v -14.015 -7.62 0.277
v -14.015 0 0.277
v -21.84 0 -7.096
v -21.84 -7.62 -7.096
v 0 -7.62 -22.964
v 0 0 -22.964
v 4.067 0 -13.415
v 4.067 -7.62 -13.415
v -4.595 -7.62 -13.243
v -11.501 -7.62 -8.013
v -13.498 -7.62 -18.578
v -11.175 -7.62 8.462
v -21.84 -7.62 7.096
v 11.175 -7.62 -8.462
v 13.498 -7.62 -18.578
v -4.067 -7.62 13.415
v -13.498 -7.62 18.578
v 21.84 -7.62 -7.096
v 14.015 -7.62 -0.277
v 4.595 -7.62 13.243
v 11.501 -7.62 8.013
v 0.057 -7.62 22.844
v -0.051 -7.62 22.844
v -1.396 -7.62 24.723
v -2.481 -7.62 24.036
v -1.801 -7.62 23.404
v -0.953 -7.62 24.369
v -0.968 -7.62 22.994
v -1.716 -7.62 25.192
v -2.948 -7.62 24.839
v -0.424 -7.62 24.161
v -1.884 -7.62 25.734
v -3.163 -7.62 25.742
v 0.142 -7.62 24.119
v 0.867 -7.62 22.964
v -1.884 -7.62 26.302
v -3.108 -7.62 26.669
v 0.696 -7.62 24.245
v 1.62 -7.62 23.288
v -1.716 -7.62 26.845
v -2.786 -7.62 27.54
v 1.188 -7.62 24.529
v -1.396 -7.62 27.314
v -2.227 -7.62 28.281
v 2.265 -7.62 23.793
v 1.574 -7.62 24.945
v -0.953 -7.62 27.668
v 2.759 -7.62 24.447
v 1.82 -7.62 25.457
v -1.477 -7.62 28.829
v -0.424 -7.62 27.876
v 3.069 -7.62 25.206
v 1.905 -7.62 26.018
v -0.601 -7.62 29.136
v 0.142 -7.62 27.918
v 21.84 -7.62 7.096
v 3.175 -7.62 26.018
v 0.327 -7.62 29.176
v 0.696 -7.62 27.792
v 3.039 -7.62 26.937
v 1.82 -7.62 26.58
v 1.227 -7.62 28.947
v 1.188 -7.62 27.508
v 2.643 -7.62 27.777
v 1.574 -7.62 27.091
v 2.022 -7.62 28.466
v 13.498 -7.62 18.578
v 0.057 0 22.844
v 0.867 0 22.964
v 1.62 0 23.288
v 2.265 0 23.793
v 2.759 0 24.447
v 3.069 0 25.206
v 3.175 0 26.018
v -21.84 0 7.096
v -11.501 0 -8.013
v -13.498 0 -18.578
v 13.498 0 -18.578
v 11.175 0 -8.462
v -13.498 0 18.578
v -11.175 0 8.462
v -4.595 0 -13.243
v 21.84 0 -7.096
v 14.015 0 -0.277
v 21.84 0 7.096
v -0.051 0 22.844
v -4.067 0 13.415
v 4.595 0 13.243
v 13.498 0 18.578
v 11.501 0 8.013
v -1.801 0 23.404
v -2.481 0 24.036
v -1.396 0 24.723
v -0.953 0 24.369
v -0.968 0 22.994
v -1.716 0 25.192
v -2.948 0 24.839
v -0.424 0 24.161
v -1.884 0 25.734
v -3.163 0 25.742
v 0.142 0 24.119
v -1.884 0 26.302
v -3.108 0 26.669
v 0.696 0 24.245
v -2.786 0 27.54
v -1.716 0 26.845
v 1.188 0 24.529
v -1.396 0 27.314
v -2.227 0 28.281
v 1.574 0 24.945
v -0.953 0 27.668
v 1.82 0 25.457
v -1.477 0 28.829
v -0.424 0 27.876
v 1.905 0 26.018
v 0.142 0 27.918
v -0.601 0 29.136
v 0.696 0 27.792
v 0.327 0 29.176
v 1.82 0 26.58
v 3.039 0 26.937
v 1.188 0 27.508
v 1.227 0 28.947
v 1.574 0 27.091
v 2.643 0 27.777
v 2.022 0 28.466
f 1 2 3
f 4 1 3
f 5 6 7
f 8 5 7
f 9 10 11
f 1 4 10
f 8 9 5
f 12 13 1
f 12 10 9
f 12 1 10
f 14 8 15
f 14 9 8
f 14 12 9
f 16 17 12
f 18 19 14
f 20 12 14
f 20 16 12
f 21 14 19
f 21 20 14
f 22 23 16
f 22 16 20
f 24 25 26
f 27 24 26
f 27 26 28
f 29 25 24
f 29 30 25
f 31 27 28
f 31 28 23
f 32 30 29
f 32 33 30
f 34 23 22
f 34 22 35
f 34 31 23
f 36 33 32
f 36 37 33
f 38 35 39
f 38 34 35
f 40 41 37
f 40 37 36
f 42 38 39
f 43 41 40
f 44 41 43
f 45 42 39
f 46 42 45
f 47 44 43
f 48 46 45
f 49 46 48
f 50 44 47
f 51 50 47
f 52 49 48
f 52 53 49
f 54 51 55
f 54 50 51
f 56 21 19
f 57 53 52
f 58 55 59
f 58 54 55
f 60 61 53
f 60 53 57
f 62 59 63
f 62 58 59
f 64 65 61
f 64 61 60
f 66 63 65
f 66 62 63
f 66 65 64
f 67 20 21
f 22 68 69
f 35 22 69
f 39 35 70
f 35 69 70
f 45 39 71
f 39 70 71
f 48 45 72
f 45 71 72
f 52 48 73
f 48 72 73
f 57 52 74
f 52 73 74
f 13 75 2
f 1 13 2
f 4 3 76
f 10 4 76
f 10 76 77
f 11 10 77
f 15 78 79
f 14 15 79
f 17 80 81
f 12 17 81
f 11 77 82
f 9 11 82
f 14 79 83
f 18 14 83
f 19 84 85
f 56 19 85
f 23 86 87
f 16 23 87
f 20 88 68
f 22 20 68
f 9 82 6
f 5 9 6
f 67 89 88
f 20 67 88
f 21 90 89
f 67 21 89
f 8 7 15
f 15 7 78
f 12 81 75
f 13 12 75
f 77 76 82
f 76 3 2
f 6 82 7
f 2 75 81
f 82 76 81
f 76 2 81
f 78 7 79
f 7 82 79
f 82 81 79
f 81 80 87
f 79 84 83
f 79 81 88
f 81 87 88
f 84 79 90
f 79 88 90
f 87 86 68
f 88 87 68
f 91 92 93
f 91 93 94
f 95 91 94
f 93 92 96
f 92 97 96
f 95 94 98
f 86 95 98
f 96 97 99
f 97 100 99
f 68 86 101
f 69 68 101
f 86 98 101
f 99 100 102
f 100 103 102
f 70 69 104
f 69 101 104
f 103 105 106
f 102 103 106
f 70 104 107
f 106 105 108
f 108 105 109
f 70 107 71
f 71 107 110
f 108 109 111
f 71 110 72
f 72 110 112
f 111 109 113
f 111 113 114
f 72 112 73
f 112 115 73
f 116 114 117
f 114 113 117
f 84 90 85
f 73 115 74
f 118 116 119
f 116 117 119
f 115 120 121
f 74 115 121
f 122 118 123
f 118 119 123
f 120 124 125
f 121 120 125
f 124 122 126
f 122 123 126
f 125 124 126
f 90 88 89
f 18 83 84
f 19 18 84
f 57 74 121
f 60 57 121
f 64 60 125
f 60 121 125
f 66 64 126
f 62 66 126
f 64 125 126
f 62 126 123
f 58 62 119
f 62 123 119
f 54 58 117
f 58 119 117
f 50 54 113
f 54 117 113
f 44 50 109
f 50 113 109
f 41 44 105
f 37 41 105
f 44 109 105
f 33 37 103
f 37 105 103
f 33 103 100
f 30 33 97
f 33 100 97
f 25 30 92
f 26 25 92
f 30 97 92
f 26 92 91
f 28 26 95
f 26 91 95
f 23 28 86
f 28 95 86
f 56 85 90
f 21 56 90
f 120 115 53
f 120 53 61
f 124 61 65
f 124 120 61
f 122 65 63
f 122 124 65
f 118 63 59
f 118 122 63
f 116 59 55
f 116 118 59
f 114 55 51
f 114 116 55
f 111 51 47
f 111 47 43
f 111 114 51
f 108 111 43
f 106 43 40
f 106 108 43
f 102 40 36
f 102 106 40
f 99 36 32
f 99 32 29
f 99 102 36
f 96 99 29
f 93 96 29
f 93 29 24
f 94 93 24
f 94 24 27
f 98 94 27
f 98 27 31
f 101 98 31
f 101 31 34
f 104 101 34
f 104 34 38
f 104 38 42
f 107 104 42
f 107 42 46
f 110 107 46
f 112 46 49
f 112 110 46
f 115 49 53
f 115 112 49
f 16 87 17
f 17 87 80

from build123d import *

# Parameters (mm, degrees)
F0_R     = 1.905
F1_DEPTH = 7.62


with BuildPart() as f1:
    # F0 (on Front) → F1 (new body)
    with BuildSketch(Plane.XZ):
        with BuildLine():
            ThreePointArc((12.6683750064, 0.8956978825), (12.6920912891, 0.4481280054), (12.7, 0))
            ThreePointArc((12.7, 0), (12.6742535258, -0.8082682494), (12.597118494, -1.6132593244))
            Line((12.597118494, -1.6132593244), (14.0147271976, -0.2774704496))
            Line((14.0147271976, -0.2774704496), (12.6683750064, 0.8956978825))
        make_face()
        with BuildLine():
            ThreePointArc((11.1395329808, 6.0992462624), (12.1849640795, 3.5800349694), (12.6683750064, 0.8956978825))
            Line((12.6683750064, 0.8956978825), (14.0147271976, -0.2774704496))
            Line((14.0147271976, -0.2774704496), (21.8401513968, 7.0962953575))
            Line((21.8401513968, 7.0962953575), (11.5012455126, 8.0131716525))
            Line((11.5012455126, 8.0131716525), (11.1395329808, 6.0992462624))
        make_face()
        with BuildLine():
            Line((14.0147271976, -0.2774704496), (12.597118494, -1.6132593244))
            ThreePointArc((12.597118494, -1.6132593244), (11.9621347738, -4.2658330549), (10.7754086772, -6.7216491905))
            Line((10.7754086772, -6.7216491905), (11.1750594361, -8.4621282708))
            Line((11.1750594361, -8.4621282708), (21.8401513968, -7.0962953575))
            Line((21.8401513968, -7.0962953575), (14.0147271976, -0.2774704496))
        make_face()
        with BuildLine():
            ThreePointArc((9.7224526655, 8.1709188081), (10.4822978426, 7.1701765626), (11.1395329808, 6.0992462624))
            Line((11.1395329808, 6.0992462624), (11.5012455126, 8.0131716525))
            Line((11.5012455126, 8.0131716525), (9.7224526655, 8.1709188081))
        make_face()
        with BuildLine():
            Line((11.1750594361, -8.4621282708), (10.7754086772, -6.7216491905))
            ThreePointArc((10.7754086772, -6.7216491905), (10.0584513163, -7.7535512584), (9.2430329028, -8.709554682))
            Line((9.2430329028, -8.709554682), (11.1750594361, -8.4621282708))
        make_face()
        with BuildLine():
            ThreePointArc((5.4270244878, 11.4820470827), (7.7535512584, 10.0584513163), (9.7224526655, 8.1709188081))
            Line((9.7224526655, 8.1709188081), (11.5012455126, 8.0131716525))
            Line((11.5012455126, 8.0131716525), (13.4979558827, 18.5783424402))
            Line((13.4979558827, 18.5783424402), (4.5946789547, 13.243054541))
            Line((4.5946789547, 13.243054541), (5.4270244878, 11.4820470827))
        make_face()
        with BuildLine():
            Line((11.1750594361, -8.4621282708), (9.2430329028, -8.709554682))
            ThreePointArc((9.2430329028, -8.709554682), (7.1701765626, -10.4822978426), (4.7666024759, -11.7715547332))
            Line((4.7666024759, -11.7715547332), (4.0668987964, -13.4145407097))
            Line((4.0668987964, -13.4145407097), (13.4979558827, -18.5783424402))
            Line((13.4979558827, -18.5783424402), (11.1750594361, -8.4621282708))
        make_face()
        with BuildLine():
            ThreePointArc((3.0628838603, 12.3251264683), (4.2658330549, 11.9621347738), (5.4270244878, 11.4820470827))
            Line((5.4270244878, 11.4820470827), (4.5946789547, 13.243054541))
            Line((4.5946789547, 13.243054541), (3.0628838603, 12.3251264683))
        make_face()
        with BuildLine():
            Line((4.0668987964, -13.4145407097), (4.7666024759, -11.7715547332))
            ThreePointArc((4.7666024759, -11.7715547332), (3.5800349694, -12.1849640795), (2.3584229018, -12.4790961779))
            Line((2.3584229018, -12.4790961779), (4.0668987964, -13.4145407097))
        make_face()
        with BuildLine():
            ThreePointArc((-2.3584229018, 12.4790961779), (0.3605453902, 12.6948811346), (3.0628838603, 12.3251264683))
            Line((3.0628838603, 12.3251264683), (4.5946789547, 13.243054541))
            Line((4.5946789547, 13.243054541), (0.0568578782, 22.8437989952))
            ThreePointArc((0.0568578782, 22.8437989952), (0.0027938397, 22.8432910784), (-0.0512710089, 22.8437038472))
            Line((-0.0512710089, 22.8437038472), (-4.0668987964, 13.4145407097))
            Line((-4.0668987964, 13.4145407097), (-2.3584229018, 12.4790961779))
        make_face()
        with BuildLine():
            Line((4.0668987964, -13.4145407097), (2.3584229018, -12.4790961779))
            ThreePointArc((2.3584229018, -12.4790961779), (-0.3605453902, -12.6948811346), (-3.0628838603, -12.3251264683))
            Line((-3.0628838603, -12.3251264683), (-4.5946789547, -13.243054541))
            Line((-4.5946789547, -13.243054541), (0, -22.9640941654))
            Line((0, -22.9640941654), (4.0668987964, -13.4145407097))
        make_face()
        with BuildLine():
            ThreePointArc((-4.7666024759, 11.7715547332), (-3.5800349694, 12.1849640795), (-2.3584229018, 12.4790961779))
            Line((-2.3584229018, 12.4790961779), (-4.0668987964, 13.4145407097))
            Line((-4.0668987964, 13.4145407097), (-4.7666024759, 11.7715547332))
        make_face()
        with BuildLine():
            ThreePointArc((-0.0512710089, 22.8437038472), (0.0027938397, 22.8432910784), (0.0568578782, 22.8437989952))
            Line((0.0568578782, 22.8437989952), (0, 22.9640941654))
            Line((0, 22.9640941654), (-0.0512710089, 22.8437038472))
        make_face()
        with BuildLine():
            Line((0, 22.9640941654), (0.0568578782, 22.8437989952))
            ThreePointArc((0.0568578782, 22.8437989952), (2.2650771249, 23.7934189274), (3.175, 26.0182898492))
            ThreePointArc((3.175, 26.0182898492), (-2.2268632139, 28.281408323), (-0.0512710089, 22.8437038472))
            Line((-0.0512710089, 22.8437038472), (0, 22.9640941654))
        make_face()
        with Locations((0, 26.0182898492)):
            Circle(F0_R, mode=Mode.SUBTRACT)
        with BuildLine():
            Line((-4.5946789547, -13.243054541), (-3.0628838603, -12.3251264683))
            ThreePointArc((-3.0628838603, -12.3251264683), (-4.2658330549, -11.9621347738), (-5.4270244878, -11.4820470827))
            Line((-5.4270244878, -11.4820470827), (-4.5946789547, -13.243054541))
        make_face()
        with BuildLine():
            ThreePointArc((-9.2430329028, 8.709554682), (-7.1701765626, 10.4822978426), (-4.7666024759, 11.7715547332))
            Line((-4.7666024759, 11.7715547332), (-4.0668987964, 13.4145407097))
            Line((-4.0668987964, 13.4145407097), (-13.4979558827, 18.5783424402))
            Line((-13.4979558827, 18.5783424402), (-11.1750594361, 8.4621282708))
            Line((-11.1750594361, 8.4621282708), (-9.2430329028, 8.709554682))
        make_face()
        with BuildLine():
            Line((-4.5946789547, -13.243054541), (-5.4270244878, -11.4820470827))
            ThreePointArc((-5.4270244878, -11.4820470827), (-7.7535512584, -10.0584513163), (-9.7224526655, -8.1709188081))
            Line((-9.7224526655, -8.1709188081), (-11.5012455126, -8.0131716525))
            Line((-11.5012455126, -8.0131716525), (-13.4979558827, -18.5783424402))
            Line((-13.4979558827, -18.5783424402), (-4.5946789547, -13.243054541))
        make_face()
        with BuildLine():
            ThreePointArc((-10.7754086772, 6.7216491905), (-10.0584513163, 7.7535512584), (-9.2430329028, 8.709554682))
            Line((-9.2430329028, 8.709554682), (-11.1750594361, 8.4621282708))
            Line((-11.1750594361, 8.4621282708), (-10.7754086772, 6.7216491905))
        make_face()
        with BuildLine():
            Line((-11.5012455126, -8.0131716525), (-9.7224526655, -8.1709188081))
            ThreePointArc((-9.7224526655, -8.1709188081), (-10.4822978426, -7.1701765626), (-11.1395329808, -6.0992462624))
            Line((-11.1395329808, -6.0992462624), (-11.5012455126, -8.0131716525))
        make_face()
        with BuildLine():
            ThreePointArc((-12.597118494, 1.6132593244), (-11.9621347738, 4.2658330549), (-10.7754086772, 6.7216491905))
            Line((-10.7754086772, 6.7216491905), (-11.1750594361, 8.4621282708))
            Line((-11.1750594361, 8.4621282708), (-21.8401513968, 7.0962953575))
            Line((-21.8401513968, 7.0962953575), (-14.0147271976, 0.2774704496))
            Line((-14.0147271976, 0.2774704496), (-12.597118494, 1.6132593244))
        make_face()
        with BuildLine():
            Line((-11.5012455126, -8.0131716525), (-11.1395329808, -6.0992462624))
            ThreePointArc((-11.1395329808, -6.0992462624), (-12.1849640795, -3.5800349694), (-12.6683750064, -0.8956978825))
            Line((-12.6683750064, -0.8956978825), (-14.0147271976, 0.2774704496))
            Line((-14.0147271976, 0.2774704496), (-21.8401513968, -7.0962953575))
            Line((-21.8401513968, -7.0962953575), (-11.5012455126, -8.0131716525))
        make_face()
        with BuildLine():
            ThreePointArc((-12.6683750064, -0.8956978825), (-12.6948811346, 0.3605453902), (-12.597118494, 1.6132593244))
            Line((-12.597118494, 1.6132593244), (-14.0147271976, 0.2774704496))
            Line((-14.0147271976, 0.2774704496), (-12.6683750064, -0.8956978825))
        make_face()
        with BuildLine():
            ThreePointArc((12.597118494, -1.6132593244), (12.6742535258, -0.8082682494), (12.7, 0))
            ThreePointArc((12.7, 0), (12.6920912891, 0.4481280054), (12.6683750064, 0.8956978825))
            ThreePointArc((12.6683750064, 0.8956978825), (12.1849640795, 3.5800349694), (11.1395329808, 6.0992462624))
            ThreePointArc((11.1395329808, 6.0992462624), (10.4822978426, 7.1701765626), (9.7224526655, 8.1709188081))
            ThreePointArc((9.7224526655, 8.1709188081), (7.7535512584, 10.0584513163), (5.4270244878, 11.4820470827))
            ThreePointArc((5.4270244878, 11.4820470827), (4.2658330549, 11.9621347738), (3.0628838603, 12.3251264683))
            ThreePointArc((3.0628838603, 12.3251264683), (0.3605453902, 12.6948811346), (-2.3584229018, 12.4790961779))
            ThreePointArc((-2.3584229018, 12.4790961779), (-3.5800349694, 12.1849640795), (-4.7666024759, 11.7715547332))
            ThreePointArc((-4.7666024759, 11.7715547332), (-7.1701765626, 10.4822978426), (-9.2430329028, 8.709554682))
            ThreePointArc((-9.2430329028, 8.709554682), (-10.0584513163, 7.7535512584), (-10.7754086772, 6.7216491905))
            ThreePointArc((-10.7754086772, 6.7216491905), (-11.9621347738, 4.2658330549), (-12.597118494, 1.6132593244))
            ThreePointArc((-12.597118494, 1.6132593244), (-12.6948811346, 0.3605453902), (-12.6683750064, -0.8956978825))
            ThreePointArc((-12.6683750064, -0.8956978825), (-12.1849640795, -3.5800349694), (-11.1395329808, -6.0992462624))
            ThreePointArc((-11.1395329808, -6.0992462624), (-10.4822978426, -7.1701765626), (-9.7224526655, -8.1709188081))
            ThreePointArc((-9.7224526655, -8.1709188081), (-7.7535512584, -10.0584513163), (-5.4270244878, -11.4820470827))
            ThreePointArc((-5.4270244878, -11.4820470827), (-4.2658330549, -11.9621347738), (-3.0628838603, -12.3251264683))
            ThreePointArc((-3.0628838603, -12.3251264683), (-0.3605453902, -12.6948811346), (2.3584229018, -12.4790961779))
            ThreePointArc((2.3584229018, -12.4790961779), (3.5800349694, -12.1849640795), (4.7666024759, -11.7715547332))
            ThreePointArc((4.7666024759, -11.7715547332), (7.1701765626, -10.4822978426), (9.2430329028, -8.709554682))
            ThreePointArc((9.2430329028, -8.709554682), (10.0584513163, -7.7535512584), (10.7754086772, -6.7216491905))
            ThreePointArc((10.7754086772, -6.7216491905), (11.9621347738, -4.2658330549), (12.597118494, -1.6132593244))
        make_face()
    extrude(amount=F1_DEPTH)


solid = f1.part
